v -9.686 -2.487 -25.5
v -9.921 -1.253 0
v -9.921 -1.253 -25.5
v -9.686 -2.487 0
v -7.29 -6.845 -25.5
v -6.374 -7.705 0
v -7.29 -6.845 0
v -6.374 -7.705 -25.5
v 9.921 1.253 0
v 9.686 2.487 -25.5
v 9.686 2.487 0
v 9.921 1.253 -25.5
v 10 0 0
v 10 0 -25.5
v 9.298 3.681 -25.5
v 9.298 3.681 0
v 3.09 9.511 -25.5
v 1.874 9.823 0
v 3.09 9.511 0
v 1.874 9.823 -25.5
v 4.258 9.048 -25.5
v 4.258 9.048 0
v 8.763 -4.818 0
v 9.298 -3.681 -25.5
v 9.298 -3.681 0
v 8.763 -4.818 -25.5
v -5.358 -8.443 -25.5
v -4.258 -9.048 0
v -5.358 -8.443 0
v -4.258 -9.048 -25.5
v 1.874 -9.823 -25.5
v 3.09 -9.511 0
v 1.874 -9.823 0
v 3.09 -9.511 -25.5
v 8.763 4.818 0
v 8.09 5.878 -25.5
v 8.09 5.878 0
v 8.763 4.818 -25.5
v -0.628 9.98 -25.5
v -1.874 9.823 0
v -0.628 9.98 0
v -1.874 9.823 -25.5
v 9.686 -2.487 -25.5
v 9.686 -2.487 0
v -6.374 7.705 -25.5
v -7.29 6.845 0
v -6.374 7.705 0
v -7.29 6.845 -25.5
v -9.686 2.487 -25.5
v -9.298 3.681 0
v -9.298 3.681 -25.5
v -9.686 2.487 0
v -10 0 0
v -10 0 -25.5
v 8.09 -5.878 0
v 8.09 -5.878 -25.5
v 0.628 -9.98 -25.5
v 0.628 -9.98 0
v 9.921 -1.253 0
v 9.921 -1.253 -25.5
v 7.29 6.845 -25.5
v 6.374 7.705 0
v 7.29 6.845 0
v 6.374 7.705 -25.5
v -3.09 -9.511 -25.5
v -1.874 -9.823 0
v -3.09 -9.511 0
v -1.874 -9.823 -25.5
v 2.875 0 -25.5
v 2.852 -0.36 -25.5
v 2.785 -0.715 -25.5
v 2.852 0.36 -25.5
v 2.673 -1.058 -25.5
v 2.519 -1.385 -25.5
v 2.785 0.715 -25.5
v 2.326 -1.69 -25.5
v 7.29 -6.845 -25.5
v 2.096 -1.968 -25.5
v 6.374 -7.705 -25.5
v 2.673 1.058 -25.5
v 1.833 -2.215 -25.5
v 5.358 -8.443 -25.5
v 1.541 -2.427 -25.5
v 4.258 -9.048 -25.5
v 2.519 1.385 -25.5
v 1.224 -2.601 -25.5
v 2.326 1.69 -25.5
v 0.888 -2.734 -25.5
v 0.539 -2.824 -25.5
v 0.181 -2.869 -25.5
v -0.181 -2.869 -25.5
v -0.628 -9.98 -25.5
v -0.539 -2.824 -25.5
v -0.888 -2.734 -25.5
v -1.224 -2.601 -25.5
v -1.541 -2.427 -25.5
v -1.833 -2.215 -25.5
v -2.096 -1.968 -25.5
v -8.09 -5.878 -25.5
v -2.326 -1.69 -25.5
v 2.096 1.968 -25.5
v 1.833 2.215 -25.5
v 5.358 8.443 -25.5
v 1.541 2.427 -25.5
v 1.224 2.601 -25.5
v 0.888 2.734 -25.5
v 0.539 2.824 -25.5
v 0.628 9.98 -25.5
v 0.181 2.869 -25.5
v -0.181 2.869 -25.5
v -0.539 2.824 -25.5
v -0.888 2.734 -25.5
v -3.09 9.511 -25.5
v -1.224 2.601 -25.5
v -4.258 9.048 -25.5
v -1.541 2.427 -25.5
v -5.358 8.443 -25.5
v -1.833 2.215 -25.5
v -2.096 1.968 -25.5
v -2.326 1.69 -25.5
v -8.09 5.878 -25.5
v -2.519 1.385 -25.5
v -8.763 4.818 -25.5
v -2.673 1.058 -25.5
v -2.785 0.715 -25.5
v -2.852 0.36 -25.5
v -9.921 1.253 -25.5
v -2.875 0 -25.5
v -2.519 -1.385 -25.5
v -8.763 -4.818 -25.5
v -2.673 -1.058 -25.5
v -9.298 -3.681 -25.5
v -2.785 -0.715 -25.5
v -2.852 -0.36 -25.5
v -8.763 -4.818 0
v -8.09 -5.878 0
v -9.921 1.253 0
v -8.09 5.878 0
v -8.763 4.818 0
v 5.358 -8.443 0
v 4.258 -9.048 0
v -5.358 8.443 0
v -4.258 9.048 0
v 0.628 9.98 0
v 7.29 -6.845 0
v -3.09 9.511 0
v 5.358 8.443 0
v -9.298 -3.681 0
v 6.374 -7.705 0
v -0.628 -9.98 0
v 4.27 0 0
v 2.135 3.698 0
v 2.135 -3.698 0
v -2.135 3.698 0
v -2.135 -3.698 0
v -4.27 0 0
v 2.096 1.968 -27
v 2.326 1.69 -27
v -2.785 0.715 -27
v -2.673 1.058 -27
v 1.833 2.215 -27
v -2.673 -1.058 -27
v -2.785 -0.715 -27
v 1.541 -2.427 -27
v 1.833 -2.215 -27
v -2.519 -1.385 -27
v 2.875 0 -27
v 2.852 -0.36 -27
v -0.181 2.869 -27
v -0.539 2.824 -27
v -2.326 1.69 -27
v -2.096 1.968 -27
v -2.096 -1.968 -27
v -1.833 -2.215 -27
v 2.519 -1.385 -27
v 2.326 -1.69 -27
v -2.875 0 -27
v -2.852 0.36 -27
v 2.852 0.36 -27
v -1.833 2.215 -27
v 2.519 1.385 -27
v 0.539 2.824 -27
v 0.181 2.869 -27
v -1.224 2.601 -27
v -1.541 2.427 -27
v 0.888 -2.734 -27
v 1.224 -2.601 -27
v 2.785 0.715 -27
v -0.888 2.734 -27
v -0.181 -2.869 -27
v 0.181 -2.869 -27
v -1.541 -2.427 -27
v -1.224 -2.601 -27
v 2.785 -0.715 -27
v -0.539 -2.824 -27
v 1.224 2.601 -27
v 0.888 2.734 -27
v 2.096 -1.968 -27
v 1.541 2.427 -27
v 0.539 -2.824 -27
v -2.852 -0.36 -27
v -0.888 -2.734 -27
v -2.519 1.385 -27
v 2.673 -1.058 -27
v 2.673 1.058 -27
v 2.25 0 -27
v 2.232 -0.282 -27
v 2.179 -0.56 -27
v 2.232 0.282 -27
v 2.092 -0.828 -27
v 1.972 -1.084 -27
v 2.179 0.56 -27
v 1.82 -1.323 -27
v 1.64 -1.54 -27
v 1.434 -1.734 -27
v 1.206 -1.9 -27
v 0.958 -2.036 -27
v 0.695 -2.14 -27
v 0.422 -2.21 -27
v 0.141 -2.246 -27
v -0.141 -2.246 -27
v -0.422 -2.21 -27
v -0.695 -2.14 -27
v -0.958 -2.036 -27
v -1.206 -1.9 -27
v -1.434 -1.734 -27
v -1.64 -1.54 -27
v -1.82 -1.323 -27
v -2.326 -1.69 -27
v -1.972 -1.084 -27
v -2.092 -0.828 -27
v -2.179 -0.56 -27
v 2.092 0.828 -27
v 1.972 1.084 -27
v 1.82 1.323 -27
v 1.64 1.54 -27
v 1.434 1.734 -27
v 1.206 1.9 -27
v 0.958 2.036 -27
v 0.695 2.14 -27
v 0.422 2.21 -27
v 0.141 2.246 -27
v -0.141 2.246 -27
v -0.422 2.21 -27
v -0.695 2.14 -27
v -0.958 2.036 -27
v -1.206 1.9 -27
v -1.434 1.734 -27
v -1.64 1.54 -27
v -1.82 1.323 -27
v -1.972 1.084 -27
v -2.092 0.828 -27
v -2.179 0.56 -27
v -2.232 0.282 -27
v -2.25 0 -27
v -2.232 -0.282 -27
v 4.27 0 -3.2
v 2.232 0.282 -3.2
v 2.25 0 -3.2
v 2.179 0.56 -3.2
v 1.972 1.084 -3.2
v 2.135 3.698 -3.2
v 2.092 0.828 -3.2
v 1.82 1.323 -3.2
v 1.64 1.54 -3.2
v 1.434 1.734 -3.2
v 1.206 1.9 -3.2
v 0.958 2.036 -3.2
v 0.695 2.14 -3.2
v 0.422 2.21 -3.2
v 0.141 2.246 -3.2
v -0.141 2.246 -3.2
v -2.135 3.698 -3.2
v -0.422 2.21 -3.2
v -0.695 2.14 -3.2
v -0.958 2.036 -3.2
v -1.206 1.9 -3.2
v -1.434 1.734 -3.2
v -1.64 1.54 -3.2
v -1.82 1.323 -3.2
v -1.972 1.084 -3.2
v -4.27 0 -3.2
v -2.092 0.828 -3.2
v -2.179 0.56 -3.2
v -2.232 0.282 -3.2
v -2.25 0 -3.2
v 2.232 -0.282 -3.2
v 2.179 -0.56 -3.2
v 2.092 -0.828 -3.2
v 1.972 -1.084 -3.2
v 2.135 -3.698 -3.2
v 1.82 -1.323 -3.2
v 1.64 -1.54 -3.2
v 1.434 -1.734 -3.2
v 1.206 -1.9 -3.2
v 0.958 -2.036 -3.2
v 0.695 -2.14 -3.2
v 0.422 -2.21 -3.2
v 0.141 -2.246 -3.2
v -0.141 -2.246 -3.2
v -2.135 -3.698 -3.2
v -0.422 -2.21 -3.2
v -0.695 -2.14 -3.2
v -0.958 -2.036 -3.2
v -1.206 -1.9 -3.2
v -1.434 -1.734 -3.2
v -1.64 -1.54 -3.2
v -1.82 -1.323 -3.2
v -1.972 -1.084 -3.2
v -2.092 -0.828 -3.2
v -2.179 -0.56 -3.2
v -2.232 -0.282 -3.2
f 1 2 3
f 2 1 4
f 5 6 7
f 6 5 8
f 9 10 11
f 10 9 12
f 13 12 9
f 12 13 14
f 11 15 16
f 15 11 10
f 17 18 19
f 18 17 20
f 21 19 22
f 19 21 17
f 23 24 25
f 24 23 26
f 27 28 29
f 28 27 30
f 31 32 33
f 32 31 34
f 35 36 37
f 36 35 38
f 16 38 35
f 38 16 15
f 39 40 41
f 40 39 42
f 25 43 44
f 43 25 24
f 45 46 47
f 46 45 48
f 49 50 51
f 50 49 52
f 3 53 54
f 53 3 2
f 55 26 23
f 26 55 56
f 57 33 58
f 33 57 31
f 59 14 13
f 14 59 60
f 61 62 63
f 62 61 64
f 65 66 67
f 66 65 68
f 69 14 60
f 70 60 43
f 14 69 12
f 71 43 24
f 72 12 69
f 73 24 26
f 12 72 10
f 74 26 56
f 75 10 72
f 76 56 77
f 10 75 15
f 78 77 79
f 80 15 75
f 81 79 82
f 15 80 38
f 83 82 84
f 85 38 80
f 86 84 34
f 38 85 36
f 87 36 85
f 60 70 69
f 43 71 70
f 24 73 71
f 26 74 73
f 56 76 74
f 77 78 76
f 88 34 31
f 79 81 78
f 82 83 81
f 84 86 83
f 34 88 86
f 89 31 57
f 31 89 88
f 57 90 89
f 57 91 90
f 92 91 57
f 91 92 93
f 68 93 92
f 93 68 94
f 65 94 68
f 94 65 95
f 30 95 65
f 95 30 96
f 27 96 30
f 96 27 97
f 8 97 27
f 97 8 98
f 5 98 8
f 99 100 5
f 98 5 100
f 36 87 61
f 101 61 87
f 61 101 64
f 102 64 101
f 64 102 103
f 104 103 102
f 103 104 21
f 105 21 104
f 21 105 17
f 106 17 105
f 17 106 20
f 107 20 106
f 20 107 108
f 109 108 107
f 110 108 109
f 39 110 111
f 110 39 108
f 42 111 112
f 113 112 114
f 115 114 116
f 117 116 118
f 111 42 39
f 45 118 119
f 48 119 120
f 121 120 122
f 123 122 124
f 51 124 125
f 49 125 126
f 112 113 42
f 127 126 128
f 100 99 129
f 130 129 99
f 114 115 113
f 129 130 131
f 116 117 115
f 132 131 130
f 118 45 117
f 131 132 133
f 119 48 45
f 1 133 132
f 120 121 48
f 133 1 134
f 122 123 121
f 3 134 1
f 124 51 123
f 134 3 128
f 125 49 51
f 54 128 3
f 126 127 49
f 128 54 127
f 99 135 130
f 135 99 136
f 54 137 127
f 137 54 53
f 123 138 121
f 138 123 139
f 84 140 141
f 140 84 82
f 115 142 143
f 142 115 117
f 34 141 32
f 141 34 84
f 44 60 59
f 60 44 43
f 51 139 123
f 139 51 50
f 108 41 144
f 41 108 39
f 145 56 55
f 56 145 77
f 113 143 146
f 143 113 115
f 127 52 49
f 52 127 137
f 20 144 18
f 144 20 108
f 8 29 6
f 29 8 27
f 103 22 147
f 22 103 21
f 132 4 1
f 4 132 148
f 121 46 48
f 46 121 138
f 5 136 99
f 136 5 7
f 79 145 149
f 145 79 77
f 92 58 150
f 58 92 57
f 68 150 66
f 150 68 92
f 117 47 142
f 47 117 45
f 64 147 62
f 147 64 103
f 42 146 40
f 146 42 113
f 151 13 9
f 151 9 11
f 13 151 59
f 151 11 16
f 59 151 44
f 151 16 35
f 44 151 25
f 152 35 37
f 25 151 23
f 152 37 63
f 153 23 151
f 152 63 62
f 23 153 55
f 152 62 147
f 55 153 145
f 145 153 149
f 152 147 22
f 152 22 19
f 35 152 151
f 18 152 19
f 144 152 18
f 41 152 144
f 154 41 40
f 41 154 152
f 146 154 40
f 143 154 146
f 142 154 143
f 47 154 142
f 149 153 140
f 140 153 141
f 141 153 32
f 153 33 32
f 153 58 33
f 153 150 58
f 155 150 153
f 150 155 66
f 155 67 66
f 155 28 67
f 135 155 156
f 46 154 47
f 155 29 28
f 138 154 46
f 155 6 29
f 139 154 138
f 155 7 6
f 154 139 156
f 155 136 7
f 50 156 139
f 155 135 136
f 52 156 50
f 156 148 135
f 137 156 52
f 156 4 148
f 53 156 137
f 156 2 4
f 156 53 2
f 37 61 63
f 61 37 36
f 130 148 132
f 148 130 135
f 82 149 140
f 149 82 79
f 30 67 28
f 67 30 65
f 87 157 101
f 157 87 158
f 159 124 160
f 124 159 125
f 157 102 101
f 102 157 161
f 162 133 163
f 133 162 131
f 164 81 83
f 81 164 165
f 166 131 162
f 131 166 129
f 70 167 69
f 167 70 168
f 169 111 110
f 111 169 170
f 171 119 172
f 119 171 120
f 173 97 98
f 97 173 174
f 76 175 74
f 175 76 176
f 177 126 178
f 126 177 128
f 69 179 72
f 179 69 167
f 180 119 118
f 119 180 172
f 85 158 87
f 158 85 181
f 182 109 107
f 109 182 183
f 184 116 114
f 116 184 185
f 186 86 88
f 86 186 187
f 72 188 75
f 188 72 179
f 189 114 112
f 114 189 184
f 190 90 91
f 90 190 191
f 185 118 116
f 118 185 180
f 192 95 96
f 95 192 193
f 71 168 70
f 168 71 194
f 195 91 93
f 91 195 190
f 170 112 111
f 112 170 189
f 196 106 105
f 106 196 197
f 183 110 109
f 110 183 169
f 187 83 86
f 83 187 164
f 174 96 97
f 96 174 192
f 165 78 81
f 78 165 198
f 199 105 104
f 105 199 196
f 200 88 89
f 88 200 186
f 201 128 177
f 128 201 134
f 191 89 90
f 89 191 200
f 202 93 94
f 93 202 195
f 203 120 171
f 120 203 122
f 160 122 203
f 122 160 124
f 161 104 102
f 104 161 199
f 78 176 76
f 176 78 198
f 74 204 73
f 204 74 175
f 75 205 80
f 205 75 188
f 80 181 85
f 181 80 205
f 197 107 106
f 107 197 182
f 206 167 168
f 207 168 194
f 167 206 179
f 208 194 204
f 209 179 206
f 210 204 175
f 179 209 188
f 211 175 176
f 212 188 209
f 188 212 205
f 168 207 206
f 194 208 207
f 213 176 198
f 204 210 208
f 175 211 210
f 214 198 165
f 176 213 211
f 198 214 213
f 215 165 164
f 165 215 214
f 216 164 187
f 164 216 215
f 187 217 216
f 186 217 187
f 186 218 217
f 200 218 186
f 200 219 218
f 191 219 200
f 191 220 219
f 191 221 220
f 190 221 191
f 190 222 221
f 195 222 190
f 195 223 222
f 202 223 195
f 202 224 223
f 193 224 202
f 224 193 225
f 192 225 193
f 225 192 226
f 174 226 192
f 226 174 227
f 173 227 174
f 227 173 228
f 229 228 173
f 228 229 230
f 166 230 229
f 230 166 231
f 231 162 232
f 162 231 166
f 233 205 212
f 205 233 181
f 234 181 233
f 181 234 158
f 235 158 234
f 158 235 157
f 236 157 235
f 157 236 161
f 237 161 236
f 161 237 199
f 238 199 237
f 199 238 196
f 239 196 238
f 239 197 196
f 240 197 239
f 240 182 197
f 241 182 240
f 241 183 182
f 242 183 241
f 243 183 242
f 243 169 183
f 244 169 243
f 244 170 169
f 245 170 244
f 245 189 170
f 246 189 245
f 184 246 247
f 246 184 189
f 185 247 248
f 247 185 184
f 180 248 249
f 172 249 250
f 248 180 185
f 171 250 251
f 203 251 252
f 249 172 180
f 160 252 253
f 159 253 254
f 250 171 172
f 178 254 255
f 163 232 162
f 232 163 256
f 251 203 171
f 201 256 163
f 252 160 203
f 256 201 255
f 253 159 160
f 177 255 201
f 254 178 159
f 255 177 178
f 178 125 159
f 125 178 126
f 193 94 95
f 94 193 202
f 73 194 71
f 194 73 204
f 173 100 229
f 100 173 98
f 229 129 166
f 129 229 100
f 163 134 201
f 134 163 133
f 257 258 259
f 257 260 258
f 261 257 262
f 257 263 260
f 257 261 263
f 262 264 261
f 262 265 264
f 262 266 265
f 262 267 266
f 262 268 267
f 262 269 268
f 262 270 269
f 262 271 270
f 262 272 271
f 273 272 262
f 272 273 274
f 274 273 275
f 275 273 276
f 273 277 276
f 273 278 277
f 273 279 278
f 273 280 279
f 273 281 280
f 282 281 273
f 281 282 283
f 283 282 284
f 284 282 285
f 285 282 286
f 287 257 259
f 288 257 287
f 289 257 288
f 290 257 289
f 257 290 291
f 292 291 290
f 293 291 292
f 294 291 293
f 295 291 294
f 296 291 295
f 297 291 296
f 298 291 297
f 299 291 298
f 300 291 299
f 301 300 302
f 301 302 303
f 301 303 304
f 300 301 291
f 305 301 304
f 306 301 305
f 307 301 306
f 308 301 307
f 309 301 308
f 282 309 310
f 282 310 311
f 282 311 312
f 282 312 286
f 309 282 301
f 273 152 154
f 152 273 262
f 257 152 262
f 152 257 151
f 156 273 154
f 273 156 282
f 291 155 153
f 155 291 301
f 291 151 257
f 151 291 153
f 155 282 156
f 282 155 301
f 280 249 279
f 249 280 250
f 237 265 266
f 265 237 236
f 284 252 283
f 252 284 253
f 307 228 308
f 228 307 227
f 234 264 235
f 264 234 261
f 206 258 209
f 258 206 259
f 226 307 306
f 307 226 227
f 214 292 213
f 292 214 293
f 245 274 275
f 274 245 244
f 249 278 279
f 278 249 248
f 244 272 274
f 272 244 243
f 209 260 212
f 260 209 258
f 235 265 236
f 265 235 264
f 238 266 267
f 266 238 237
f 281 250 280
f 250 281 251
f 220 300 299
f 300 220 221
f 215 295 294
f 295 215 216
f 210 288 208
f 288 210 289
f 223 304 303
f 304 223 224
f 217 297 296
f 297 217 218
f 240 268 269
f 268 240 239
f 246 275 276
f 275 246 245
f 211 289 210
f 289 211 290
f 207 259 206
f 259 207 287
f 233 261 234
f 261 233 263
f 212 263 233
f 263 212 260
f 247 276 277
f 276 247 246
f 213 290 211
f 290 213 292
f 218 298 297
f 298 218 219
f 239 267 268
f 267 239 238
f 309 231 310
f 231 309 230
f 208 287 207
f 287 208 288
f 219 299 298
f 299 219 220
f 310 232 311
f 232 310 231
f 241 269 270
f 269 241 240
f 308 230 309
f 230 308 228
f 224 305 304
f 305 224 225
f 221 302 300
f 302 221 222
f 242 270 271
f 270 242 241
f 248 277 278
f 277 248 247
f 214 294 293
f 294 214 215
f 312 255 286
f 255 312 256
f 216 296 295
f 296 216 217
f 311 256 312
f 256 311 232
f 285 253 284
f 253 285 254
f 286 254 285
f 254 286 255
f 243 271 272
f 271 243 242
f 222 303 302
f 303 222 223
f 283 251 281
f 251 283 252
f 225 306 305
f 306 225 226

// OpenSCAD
$fn = 50;


difference() {
	union() {
		translate(v = [0, 0, -25.5000000000]) {
			cylinder(h = 25.5000000000, r = 10.0000000000);
		}
		#translate(v = [0, 0, -27.0000000000]) {
			cylinder(h = 27, r = 2.8750000000);
		}
	}
	union() {
		translate(v = [0, 0, 0]) {
			rotate(a = [0, 0, 0]) {
				difference() {
					union() {
						translate(v = [0, 0, -3.2000000000]) {
							linear_extrude(height = 3.2000000000) {
								polygon(points = [[4.2698000000, 0.0000000000], [2.1349000000, 3.6977552691], [-2.1349000000, 3.6977552691], [-4.2698000000, 0.0000000000], [-2.1349000000, -3.6977552691], [2.1349000000, -3.6977552691]]);
							}
						}
					}
					union();
				}
			}
		}
		#translate(v = [0, 0, -100.0000000000]) {
			cylinder(h = 200, r = 2.2500000000);
		}
	}
}
